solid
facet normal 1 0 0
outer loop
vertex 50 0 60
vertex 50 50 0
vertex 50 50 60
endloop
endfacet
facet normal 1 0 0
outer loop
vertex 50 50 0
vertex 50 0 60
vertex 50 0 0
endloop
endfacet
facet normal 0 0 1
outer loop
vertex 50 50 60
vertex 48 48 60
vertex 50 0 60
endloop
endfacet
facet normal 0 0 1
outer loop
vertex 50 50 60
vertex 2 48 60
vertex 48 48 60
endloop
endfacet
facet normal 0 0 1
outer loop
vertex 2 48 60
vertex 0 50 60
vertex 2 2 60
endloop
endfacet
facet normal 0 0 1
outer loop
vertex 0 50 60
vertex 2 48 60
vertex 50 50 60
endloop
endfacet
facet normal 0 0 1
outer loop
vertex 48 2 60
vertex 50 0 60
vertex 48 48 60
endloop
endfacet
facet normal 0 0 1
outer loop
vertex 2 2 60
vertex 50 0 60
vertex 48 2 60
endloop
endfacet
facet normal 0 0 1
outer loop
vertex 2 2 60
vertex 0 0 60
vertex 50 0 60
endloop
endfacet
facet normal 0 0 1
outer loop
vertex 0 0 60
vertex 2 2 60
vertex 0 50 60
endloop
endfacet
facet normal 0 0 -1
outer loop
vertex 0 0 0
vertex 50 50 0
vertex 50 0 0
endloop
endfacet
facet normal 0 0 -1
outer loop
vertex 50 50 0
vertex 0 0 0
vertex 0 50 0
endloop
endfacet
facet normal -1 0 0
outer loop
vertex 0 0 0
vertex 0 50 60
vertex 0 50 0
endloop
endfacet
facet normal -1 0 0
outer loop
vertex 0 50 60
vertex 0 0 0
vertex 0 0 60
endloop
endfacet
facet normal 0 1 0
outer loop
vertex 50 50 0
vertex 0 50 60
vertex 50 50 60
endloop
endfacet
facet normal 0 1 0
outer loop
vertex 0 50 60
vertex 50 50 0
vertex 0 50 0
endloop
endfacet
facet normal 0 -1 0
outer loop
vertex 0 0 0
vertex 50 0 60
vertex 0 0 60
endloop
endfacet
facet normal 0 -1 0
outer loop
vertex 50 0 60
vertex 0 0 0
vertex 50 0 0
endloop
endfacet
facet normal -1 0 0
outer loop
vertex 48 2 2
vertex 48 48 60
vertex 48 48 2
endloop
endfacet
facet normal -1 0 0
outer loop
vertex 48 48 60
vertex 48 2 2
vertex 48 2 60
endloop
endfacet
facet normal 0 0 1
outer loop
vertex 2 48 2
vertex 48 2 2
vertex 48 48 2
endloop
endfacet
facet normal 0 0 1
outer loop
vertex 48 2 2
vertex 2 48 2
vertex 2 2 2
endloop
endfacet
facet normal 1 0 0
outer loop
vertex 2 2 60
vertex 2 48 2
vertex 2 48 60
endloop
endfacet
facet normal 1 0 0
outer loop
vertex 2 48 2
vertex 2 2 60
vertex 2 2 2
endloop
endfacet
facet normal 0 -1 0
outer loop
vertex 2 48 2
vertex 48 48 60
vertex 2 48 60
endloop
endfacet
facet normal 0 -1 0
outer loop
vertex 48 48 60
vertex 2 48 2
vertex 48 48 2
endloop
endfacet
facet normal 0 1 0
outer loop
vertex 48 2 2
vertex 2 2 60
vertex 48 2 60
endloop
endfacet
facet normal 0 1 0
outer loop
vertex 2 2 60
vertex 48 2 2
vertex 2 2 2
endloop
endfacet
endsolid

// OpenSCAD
// This file is designed to replicate box design. It will take arguments for length, width, and height. Number of cut out sections. 
// Wall thickness is 2 mm

// All measurements in mm. Added 0.2 to all dimentions for PLA shrinkage.


module Box_equal_volume_horizontal (Box_Width,Box_Length,Box_Height,Number_of_Cut_outs){
Wall_thickness = 2;
//create hollow box
difference(){        
    cube([Box_Width,Box_Length,Box_Height]);    
    translate([Wall_thickness , Wall_thickness, Wall_thickness])
    cube([Box_Width-(2*Wall_thickness),Box_Length-(2*Wall_thickness),Box_Height]);       
}

//create walls subdivng the box
Delta_Y =  (Box_Length-(2*Wall_thickness))/Number_of_Cut_outs;

for (ii =[1:1:Number_of_Cut_outs-1]){

Y_pos_wall = Wall_thickness + Delta_Y * ii;
    
translate([Wall_thickness , Y_pos_wall , Wall_thickness])
cube([Box_Width-Wall_thickness,Wall_thickness,Box_Height*0.9]);
    
}
}


Box_equal_volume_horizontal (50,50,60,1);
